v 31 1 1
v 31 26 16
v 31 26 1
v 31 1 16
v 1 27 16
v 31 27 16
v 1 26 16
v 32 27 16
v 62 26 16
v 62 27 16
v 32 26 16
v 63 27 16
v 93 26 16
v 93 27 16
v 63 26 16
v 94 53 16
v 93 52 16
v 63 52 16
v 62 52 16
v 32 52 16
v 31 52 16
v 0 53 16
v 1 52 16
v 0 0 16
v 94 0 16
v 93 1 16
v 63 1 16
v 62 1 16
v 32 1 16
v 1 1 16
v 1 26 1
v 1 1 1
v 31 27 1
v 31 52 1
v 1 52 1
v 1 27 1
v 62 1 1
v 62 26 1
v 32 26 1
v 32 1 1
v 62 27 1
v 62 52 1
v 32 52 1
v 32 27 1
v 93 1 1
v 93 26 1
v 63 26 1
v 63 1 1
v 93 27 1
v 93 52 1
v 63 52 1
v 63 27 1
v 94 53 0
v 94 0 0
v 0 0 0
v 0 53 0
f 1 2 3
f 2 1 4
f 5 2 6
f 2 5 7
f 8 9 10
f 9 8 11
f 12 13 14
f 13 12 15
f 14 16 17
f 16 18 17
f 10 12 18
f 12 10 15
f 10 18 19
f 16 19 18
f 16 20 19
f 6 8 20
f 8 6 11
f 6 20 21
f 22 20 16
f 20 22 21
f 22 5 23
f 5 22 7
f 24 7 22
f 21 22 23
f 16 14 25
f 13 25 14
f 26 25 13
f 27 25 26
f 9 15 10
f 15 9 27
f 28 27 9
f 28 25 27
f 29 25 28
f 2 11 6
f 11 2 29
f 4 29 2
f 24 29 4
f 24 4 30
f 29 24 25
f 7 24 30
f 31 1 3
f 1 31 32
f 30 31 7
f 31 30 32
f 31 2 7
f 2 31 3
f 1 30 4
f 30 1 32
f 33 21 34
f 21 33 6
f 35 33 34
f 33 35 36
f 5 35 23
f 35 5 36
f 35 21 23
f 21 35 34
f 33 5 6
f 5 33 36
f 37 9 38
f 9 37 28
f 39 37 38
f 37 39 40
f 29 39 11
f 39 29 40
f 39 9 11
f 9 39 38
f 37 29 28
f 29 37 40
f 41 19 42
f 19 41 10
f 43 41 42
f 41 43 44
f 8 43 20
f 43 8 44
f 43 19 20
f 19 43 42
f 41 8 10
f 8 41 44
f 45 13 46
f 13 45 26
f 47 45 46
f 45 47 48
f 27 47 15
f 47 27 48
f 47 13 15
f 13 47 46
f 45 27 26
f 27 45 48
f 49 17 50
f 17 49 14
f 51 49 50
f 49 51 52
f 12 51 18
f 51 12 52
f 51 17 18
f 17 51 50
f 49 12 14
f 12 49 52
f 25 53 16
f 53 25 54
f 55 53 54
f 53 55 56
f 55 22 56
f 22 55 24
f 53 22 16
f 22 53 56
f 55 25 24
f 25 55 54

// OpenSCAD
$fs=0.25;$fa=6;
difference(){translate([47,26.5,8])cube([94,53,16],center=true);
union() {
translate([16,13.5,8.5])cube([30,25,15],center=true);
translate([16,39.5,8.5])cube([30,25,15],center=true);
translate([47,13.5,8.5])cube([30,25,15],center=true);
translate([47,39.5,8.5])cube([30,25,15],center=true);
translate([78,13.5,8.5])cube([30,25,15],center=true);
translate([78,39.5,8.5])cube([30,25,15],center=true);
}
}
